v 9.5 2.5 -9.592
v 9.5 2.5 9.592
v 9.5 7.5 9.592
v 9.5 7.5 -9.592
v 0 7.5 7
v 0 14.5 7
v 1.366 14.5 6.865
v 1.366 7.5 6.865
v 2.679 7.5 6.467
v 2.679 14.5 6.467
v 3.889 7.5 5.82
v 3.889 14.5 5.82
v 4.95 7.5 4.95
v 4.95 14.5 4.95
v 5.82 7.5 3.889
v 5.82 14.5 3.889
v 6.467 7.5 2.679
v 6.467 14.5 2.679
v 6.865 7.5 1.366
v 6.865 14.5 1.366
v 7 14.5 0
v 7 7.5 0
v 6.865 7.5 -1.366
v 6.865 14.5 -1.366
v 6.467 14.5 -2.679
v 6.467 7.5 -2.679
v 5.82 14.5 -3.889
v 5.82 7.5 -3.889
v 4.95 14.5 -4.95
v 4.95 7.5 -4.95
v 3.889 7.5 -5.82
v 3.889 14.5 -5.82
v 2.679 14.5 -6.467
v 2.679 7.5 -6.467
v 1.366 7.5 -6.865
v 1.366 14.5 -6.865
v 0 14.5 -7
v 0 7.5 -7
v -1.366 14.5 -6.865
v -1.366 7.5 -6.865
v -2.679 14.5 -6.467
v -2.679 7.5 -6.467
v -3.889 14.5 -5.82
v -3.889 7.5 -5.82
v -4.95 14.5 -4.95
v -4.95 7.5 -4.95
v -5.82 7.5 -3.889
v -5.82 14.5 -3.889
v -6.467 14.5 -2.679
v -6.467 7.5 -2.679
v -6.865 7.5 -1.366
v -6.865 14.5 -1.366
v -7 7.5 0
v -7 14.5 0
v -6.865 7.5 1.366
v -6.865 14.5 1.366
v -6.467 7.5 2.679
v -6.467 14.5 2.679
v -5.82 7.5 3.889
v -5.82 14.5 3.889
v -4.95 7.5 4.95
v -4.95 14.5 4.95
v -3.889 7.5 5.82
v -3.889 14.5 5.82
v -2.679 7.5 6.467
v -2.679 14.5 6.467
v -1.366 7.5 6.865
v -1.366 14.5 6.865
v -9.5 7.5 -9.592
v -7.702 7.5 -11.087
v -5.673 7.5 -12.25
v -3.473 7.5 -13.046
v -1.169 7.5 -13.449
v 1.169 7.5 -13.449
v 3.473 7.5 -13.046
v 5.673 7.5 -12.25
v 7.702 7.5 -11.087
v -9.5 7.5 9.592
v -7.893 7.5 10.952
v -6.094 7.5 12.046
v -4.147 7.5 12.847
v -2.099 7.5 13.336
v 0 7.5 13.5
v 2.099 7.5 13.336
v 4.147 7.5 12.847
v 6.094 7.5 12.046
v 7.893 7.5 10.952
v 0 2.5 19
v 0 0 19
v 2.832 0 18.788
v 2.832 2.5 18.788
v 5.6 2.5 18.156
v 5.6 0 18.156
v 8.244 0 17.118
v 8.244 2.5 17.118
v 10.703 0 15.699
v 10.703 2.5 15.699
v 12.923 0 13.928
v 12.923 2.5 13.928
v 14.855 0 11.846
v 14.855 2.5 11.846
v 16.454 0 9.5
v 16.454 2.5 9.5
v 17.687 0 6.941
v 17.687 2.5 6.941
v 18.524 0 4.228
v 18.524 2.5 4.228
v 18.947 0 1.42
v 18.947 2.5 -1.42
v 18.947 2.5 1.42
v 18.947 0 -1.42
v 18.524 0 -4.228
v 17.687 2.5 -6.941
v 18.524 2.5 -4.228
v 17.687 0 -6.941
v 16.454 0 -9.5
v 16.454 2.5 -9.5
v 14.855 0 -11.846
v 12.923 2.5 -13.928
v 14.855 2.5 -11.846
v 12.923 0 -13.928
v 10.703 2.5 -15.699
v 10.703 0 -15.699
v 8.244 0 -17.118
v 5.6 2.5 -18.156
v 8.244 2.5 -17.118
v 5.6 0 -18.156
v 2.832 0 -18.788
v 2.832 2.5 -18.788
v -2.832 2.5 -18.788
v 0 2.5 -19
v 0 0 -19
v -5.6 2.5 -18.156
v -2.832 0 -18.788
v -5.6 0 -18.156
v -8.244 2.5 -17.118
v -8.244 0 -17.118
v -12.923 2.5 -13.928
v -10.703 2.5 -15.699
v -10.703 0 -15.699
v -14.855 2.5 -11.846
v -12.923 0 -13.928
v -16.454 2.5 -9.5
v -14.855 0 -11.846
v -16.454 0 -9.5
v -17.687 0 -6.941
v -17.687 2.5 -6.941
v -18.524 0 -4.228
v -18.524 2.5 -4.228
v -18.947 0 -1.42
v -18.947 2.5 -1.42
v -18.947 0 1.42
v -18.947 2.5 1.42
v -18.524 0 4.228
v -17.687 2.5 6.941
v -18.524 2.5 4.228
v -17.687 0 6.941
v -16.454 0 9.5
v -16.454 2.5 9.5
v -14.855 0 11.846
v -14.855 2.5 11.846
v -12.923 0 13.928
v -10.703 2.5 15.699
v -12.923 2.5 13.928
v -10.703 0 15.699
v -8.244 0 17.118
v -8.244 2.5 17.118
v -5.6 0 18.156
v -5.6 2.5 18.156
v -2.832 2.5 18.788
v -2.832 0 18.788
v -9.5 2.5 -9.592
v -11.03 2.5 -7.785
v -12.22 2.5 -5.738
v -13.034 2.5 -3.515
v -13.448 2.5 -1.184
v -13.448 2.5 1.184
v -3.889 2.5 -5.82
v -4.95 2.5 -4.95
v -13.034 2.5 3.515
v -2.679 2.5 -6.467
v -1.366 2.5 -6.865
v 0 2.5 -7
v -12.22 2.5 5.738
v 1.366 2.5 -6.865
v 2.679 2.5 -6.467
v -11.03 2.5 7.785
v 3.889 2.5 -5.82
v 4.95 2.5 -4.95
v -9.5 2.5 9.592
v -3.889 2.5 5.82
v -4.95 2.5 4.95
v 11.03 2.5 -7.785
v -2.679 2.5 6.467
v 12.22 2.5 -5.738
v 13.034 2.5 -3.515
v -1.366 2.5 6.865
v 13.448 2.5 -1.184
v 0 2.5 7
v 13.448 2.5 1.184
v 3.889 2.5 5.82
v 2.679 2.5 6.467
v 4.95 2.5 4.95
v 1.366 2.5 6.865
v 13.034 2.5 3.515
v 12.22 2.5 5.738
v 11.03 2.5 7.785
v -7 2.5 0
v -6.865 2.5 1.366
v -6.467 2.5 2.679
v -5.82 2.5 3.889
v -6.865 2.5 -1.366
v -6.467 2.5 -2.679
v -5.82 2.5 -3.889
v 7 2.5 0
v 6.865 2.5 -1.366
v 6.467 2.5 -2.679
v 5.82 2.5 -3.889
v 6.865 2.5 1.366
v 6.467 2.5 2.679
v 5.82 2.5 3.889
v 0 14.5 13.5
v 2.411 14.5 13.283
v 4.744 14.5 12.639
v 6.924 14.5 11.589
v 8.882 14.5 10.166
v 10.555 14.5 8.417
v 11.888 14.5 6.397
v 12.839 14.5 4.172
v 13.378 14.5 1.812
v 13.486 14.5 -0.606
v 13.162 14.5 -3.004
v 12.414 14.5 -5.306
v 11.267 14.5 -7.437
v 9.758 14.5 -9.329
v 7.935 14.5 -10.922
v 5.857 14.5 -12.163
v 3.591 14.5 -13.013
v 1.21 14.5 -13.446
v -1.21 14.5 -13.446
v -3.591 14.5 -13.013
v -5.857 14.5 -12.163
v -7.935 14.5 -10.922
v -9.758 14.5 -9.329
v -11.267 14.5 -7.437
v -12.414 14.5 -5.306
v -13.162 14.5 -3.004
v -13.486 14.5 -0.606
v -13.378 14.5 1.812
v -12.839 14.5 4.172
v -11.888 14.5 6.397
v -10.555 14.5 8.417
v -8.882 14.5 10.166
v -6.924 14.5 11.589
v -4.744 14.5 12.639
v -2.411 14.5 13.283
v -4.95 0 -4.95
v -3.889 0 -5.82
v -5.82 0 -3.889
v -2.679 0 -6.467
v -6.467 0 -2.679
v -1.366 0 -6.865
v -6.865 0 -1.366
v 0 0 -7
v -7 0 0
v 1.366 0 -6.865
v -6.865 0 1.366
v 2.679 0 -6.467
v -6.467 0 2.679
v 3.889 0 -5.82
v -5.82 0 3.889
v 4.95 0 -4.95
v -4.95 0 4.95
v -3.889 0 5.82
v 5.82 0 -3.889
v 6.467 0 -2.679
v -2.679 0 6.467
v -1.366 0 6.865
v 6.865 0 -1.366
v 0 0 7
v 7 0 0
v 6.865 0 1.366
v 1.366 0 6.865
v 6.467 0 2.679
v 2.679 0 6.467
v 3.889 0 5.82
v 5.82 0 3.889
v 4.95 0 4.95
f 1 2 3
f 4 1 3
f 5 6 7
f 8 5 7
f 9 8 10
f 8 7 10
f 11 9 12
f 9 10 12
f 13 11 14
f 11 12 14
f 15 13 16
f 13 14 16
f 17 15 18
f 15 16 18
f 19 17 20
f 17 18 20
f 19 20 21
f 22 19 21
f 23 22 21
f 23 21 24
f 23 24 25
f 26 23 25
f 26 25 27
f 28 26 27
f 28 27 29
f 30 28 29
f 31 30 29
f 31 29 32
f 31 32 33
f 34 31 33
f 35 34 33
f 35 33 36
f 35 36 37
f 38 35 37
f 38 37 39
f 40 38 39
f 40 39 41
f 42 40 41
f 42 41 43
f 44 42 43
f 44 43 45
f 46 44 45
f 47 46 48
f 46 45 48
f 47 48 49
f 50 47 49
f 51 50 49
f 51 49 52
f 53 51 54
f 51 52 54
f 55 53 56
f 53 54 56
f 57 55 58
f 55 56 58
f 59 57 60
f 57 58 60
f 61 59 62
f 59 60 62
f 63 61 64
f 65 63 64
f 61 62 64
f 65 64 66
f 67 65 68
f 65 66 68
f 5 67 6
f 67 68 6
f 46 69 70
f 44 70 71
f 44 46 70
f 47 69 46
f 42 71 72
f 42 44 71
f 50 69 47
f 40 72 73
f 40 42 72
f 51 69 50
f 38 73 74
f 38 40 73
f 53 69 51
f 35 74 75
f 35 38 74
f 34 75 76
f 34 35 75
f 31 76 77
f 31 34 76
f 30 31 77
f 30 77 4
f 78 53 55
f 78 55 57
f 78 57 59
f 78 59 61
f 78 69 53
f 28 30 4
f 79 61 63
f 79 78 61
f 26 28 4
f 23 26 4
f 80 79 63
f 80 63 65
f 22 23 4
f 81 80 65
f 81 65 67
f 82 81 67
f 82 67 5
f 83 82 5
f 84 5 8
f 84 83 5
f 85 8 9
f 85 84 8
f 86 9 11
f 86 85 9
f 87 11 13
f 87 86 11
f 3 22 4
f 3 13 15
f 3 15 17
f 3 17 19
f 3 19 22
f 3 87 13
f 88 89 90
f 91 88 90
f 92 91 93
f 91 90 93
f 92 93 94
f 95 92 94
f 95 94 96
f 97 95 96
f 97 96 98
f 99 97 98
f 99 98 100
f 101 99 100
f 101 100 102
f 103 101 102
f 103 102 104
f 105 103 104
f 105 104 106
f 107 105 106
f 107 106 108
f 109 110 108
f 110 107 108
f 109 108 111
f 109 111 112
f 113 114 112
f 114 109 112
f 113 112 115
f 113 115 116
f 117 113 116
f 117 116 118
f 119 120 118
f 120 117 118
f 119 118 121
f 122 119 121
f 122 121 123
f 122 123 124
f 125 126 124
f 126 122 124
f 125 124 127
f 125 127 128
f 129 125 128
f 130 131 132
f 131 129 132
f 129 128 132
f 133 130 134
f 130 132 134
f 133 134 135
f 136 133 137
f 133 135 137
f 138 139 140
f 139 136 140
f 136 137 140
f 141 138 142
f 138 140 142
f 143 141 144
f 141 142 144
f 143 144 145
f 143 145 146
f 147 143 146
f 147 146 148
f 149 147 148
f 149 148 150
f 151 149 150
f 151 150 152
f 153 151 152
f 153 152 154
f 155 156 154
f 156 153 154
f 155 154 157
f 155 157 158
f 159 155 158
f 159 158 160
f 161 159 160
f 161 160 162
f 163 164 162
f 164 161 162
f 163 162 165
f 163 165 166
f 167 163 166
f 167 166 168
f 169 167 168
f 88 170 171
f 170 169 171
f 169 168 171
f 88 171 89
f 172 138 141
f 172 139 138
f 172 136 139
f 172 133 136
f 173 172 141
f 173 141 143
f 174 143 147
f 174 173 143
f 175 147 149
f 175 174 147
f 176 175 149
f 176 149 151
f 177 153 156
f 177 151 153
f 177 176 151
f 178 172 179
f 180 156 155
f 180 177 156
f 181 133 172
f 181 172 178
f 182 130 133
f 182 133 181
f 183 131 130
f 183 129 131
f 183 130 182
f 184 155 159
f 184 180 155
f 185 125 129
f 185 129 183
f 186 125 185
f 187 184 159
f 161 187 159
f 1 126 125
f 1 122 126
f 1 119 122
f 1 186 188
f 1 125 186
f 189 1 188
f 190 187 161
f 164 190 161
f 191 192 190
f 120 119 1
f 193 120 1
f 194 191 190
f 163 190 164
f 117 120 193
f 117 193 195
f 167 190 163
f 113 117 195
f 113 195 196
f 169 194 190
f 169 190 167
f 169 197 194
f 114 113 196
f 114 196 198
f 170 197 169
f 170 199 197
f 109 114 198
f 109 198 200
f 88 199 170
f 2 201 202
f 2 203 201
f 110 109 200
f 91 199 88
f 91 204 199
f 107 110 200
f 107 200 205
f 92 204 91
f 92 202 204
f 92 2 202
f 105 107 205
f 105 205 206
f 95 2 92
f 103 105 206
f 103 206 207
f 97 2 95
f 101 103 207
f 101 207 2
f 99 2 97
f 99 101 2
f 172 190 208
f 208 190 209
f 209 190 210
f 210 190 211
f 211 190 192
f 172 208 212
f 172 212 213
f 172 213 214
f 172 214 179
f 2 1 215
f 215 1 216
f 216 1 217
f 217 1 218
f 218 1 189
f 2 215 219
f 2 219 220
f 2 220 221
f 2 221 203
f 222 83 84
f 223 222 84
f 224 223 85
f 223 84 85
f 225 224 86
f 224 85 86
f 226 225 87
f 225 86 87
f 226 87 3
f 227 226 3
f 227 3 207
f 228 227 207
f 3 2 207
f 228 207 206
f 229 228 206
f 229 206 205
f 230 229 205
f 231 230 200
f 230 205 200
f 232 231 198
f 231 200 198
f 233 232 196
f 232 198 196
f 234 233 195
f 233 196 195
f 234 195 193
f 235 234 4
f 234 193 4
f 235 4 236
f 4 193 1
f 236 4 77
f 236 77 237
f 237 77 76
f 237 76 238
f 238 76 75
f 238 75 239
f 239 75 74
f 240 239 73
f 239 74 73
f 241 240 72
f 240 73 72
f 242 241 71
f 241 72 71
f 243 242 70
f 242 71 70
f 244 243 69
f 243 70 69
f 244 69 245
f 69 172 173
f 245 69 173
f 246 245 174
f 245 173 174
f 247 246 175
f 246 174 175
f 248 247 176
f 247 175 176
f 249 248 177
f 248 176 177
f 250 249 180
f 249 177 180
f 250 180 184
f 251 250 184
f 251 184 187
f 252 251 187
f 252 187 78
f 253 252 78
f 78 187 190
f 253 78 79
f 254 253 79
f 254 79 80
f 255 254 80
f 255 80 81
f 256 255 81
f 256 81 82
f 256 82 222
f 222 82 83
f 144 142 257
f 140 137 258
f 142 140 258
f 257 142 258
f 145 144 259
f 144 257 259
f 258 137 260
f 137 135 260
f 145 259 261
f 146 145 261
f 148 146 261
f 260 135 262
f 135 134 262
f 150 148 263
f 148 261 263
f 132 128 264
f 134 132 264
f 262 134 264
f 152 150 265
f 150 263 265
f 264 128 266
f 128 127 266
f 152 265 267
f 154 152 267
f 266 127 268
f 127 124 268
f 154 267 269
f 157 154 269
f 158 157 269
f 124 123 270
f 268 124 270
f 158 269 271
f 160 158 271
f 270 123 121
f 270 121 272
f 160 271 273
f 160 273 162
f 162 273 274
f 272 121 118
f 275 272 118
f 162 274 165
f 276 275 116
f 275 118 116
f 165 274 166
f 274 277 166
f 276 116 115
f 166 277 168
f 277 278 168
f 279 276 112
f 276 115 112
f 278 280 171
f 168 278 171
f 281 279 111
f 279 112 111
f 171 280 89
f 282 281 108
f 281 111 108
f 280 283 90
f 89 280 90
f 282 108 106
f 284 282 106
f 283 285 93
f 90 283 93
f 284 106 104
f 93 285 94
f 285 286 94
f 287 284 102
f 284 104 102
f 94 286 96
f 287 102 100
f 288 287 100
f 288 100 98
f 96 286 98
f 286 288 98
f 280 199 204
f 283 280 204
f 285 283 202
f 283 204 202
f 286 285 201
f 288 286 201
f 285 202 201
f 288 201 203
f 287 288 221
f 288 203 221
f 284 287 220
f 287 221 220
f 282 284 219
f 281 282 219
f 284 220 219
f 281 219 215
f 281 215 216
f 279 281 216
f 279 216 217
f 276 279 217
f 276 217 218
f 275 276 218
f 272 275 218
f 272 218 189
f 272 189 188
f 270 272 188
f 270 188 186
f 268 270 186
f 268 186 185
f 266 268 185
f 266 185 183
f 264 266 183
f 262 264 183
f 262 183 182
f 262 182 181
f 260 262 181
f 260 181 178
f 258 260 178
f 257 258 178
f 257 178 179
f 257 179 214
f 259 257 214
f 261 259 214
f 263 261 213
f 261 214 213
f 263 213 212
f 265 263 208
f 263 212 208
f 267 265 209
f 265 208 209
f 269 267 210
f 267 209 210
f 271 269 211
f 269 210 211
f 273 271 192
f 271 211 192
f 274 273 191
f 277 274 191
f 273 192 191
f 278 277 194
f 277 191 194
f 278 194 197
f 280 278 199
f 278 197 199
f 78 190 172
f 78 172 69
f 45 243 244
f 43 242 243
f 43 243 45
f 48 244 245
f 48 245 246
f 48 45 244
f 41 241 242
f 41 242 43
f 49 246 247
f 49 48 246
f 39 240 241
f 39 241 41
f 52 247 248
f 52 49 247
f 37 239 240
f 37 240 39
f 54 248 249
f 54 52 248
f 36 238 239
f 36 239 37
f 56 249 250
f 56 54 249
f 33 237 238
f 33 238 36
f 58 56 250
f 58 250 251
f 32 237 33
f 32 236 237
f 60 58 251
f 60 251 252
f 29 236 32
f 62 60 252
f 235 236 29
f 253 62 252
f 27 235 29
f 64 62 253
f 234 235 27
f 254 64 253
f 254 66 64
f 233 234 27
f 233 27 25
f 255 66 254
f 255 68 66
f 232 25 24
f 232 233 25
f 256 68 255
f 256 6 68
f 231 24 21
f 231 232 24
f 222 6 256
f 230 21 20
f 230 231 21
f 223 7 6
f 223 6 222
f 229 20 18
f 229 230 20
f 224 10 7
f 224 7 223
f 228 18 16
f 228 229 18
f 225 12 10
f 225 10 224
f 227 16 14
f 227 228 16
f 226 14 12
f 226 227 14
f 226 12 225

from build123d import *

# Parameters (mm, degrees)
SKETCH1_R           = 19
BOSS_EXTRUDE1_DEPTH = 2.5
SKETCH2_R           = 13.5
BOSS_EXTRUDE2_DEPTH = 12
SKETCH3_R           = 7
CUT_EXTRUDE1_DEPTH  = 31.532769282
SKETCH4_W           = 19
SKETCH4_H           = 5
CUT_EXTRUDE2_DEPTH  = 17.5


with BuildPart() as part:
    # Sketch1 → Boss-Extrude1 (new body)
    with BuildSketch(Plane(origin=(0, 0, 0), x_dir=(1, 0, 0), z_dir=(0, 1, 0))):
        with Locations(Location((0, 0, 0), (0, 0, 270))):
            Circle(SKETCH1_R)
    extrude(amount=BOSS_EXTRUDE1_DEPTH)

    # Sketch2 → Boss-Extrude2 (add)
    with BuildSketch(Plane(origin=(0, 2.5, 0), x_dir=(1, 0, 0), z_dir=(0, 1, 0))):
        with Locations(Location((0, 0, 0), (0, 0, 270))):
            Circle(SKETCH2_R)
    extrude(amount=BOSS_EXTRUDE2_DEPTH)

    # Sketch3 → Cut-Extrude1 (cut, through all)
    with BuildSketch(Plane(origin=(0, 14.5, 0), x_dir=(1, 0, 0), z_dir=(0, 1, 0))):
        with Locations(Location((0, 0, 0), (0, 0, 270))):
            Circle(SKETCH3_R)
    extrude(amount=-CUT_EXTRUDE1_DEPTH, mode=Mode.SUBTRACT)

    # Sketch4 → Cut-Extrude2 (cut, symmetric)
    with BuildSketch(Plane.XY):
        with Locations((0, 5)):
            Rectangle(SKETCH4_W, SKETCH4_H)
    extrude(amount=CUT_EXTRUDE2_DEPTH, both=True, mode=Mode.SUBTRACT)


solid = part.part
